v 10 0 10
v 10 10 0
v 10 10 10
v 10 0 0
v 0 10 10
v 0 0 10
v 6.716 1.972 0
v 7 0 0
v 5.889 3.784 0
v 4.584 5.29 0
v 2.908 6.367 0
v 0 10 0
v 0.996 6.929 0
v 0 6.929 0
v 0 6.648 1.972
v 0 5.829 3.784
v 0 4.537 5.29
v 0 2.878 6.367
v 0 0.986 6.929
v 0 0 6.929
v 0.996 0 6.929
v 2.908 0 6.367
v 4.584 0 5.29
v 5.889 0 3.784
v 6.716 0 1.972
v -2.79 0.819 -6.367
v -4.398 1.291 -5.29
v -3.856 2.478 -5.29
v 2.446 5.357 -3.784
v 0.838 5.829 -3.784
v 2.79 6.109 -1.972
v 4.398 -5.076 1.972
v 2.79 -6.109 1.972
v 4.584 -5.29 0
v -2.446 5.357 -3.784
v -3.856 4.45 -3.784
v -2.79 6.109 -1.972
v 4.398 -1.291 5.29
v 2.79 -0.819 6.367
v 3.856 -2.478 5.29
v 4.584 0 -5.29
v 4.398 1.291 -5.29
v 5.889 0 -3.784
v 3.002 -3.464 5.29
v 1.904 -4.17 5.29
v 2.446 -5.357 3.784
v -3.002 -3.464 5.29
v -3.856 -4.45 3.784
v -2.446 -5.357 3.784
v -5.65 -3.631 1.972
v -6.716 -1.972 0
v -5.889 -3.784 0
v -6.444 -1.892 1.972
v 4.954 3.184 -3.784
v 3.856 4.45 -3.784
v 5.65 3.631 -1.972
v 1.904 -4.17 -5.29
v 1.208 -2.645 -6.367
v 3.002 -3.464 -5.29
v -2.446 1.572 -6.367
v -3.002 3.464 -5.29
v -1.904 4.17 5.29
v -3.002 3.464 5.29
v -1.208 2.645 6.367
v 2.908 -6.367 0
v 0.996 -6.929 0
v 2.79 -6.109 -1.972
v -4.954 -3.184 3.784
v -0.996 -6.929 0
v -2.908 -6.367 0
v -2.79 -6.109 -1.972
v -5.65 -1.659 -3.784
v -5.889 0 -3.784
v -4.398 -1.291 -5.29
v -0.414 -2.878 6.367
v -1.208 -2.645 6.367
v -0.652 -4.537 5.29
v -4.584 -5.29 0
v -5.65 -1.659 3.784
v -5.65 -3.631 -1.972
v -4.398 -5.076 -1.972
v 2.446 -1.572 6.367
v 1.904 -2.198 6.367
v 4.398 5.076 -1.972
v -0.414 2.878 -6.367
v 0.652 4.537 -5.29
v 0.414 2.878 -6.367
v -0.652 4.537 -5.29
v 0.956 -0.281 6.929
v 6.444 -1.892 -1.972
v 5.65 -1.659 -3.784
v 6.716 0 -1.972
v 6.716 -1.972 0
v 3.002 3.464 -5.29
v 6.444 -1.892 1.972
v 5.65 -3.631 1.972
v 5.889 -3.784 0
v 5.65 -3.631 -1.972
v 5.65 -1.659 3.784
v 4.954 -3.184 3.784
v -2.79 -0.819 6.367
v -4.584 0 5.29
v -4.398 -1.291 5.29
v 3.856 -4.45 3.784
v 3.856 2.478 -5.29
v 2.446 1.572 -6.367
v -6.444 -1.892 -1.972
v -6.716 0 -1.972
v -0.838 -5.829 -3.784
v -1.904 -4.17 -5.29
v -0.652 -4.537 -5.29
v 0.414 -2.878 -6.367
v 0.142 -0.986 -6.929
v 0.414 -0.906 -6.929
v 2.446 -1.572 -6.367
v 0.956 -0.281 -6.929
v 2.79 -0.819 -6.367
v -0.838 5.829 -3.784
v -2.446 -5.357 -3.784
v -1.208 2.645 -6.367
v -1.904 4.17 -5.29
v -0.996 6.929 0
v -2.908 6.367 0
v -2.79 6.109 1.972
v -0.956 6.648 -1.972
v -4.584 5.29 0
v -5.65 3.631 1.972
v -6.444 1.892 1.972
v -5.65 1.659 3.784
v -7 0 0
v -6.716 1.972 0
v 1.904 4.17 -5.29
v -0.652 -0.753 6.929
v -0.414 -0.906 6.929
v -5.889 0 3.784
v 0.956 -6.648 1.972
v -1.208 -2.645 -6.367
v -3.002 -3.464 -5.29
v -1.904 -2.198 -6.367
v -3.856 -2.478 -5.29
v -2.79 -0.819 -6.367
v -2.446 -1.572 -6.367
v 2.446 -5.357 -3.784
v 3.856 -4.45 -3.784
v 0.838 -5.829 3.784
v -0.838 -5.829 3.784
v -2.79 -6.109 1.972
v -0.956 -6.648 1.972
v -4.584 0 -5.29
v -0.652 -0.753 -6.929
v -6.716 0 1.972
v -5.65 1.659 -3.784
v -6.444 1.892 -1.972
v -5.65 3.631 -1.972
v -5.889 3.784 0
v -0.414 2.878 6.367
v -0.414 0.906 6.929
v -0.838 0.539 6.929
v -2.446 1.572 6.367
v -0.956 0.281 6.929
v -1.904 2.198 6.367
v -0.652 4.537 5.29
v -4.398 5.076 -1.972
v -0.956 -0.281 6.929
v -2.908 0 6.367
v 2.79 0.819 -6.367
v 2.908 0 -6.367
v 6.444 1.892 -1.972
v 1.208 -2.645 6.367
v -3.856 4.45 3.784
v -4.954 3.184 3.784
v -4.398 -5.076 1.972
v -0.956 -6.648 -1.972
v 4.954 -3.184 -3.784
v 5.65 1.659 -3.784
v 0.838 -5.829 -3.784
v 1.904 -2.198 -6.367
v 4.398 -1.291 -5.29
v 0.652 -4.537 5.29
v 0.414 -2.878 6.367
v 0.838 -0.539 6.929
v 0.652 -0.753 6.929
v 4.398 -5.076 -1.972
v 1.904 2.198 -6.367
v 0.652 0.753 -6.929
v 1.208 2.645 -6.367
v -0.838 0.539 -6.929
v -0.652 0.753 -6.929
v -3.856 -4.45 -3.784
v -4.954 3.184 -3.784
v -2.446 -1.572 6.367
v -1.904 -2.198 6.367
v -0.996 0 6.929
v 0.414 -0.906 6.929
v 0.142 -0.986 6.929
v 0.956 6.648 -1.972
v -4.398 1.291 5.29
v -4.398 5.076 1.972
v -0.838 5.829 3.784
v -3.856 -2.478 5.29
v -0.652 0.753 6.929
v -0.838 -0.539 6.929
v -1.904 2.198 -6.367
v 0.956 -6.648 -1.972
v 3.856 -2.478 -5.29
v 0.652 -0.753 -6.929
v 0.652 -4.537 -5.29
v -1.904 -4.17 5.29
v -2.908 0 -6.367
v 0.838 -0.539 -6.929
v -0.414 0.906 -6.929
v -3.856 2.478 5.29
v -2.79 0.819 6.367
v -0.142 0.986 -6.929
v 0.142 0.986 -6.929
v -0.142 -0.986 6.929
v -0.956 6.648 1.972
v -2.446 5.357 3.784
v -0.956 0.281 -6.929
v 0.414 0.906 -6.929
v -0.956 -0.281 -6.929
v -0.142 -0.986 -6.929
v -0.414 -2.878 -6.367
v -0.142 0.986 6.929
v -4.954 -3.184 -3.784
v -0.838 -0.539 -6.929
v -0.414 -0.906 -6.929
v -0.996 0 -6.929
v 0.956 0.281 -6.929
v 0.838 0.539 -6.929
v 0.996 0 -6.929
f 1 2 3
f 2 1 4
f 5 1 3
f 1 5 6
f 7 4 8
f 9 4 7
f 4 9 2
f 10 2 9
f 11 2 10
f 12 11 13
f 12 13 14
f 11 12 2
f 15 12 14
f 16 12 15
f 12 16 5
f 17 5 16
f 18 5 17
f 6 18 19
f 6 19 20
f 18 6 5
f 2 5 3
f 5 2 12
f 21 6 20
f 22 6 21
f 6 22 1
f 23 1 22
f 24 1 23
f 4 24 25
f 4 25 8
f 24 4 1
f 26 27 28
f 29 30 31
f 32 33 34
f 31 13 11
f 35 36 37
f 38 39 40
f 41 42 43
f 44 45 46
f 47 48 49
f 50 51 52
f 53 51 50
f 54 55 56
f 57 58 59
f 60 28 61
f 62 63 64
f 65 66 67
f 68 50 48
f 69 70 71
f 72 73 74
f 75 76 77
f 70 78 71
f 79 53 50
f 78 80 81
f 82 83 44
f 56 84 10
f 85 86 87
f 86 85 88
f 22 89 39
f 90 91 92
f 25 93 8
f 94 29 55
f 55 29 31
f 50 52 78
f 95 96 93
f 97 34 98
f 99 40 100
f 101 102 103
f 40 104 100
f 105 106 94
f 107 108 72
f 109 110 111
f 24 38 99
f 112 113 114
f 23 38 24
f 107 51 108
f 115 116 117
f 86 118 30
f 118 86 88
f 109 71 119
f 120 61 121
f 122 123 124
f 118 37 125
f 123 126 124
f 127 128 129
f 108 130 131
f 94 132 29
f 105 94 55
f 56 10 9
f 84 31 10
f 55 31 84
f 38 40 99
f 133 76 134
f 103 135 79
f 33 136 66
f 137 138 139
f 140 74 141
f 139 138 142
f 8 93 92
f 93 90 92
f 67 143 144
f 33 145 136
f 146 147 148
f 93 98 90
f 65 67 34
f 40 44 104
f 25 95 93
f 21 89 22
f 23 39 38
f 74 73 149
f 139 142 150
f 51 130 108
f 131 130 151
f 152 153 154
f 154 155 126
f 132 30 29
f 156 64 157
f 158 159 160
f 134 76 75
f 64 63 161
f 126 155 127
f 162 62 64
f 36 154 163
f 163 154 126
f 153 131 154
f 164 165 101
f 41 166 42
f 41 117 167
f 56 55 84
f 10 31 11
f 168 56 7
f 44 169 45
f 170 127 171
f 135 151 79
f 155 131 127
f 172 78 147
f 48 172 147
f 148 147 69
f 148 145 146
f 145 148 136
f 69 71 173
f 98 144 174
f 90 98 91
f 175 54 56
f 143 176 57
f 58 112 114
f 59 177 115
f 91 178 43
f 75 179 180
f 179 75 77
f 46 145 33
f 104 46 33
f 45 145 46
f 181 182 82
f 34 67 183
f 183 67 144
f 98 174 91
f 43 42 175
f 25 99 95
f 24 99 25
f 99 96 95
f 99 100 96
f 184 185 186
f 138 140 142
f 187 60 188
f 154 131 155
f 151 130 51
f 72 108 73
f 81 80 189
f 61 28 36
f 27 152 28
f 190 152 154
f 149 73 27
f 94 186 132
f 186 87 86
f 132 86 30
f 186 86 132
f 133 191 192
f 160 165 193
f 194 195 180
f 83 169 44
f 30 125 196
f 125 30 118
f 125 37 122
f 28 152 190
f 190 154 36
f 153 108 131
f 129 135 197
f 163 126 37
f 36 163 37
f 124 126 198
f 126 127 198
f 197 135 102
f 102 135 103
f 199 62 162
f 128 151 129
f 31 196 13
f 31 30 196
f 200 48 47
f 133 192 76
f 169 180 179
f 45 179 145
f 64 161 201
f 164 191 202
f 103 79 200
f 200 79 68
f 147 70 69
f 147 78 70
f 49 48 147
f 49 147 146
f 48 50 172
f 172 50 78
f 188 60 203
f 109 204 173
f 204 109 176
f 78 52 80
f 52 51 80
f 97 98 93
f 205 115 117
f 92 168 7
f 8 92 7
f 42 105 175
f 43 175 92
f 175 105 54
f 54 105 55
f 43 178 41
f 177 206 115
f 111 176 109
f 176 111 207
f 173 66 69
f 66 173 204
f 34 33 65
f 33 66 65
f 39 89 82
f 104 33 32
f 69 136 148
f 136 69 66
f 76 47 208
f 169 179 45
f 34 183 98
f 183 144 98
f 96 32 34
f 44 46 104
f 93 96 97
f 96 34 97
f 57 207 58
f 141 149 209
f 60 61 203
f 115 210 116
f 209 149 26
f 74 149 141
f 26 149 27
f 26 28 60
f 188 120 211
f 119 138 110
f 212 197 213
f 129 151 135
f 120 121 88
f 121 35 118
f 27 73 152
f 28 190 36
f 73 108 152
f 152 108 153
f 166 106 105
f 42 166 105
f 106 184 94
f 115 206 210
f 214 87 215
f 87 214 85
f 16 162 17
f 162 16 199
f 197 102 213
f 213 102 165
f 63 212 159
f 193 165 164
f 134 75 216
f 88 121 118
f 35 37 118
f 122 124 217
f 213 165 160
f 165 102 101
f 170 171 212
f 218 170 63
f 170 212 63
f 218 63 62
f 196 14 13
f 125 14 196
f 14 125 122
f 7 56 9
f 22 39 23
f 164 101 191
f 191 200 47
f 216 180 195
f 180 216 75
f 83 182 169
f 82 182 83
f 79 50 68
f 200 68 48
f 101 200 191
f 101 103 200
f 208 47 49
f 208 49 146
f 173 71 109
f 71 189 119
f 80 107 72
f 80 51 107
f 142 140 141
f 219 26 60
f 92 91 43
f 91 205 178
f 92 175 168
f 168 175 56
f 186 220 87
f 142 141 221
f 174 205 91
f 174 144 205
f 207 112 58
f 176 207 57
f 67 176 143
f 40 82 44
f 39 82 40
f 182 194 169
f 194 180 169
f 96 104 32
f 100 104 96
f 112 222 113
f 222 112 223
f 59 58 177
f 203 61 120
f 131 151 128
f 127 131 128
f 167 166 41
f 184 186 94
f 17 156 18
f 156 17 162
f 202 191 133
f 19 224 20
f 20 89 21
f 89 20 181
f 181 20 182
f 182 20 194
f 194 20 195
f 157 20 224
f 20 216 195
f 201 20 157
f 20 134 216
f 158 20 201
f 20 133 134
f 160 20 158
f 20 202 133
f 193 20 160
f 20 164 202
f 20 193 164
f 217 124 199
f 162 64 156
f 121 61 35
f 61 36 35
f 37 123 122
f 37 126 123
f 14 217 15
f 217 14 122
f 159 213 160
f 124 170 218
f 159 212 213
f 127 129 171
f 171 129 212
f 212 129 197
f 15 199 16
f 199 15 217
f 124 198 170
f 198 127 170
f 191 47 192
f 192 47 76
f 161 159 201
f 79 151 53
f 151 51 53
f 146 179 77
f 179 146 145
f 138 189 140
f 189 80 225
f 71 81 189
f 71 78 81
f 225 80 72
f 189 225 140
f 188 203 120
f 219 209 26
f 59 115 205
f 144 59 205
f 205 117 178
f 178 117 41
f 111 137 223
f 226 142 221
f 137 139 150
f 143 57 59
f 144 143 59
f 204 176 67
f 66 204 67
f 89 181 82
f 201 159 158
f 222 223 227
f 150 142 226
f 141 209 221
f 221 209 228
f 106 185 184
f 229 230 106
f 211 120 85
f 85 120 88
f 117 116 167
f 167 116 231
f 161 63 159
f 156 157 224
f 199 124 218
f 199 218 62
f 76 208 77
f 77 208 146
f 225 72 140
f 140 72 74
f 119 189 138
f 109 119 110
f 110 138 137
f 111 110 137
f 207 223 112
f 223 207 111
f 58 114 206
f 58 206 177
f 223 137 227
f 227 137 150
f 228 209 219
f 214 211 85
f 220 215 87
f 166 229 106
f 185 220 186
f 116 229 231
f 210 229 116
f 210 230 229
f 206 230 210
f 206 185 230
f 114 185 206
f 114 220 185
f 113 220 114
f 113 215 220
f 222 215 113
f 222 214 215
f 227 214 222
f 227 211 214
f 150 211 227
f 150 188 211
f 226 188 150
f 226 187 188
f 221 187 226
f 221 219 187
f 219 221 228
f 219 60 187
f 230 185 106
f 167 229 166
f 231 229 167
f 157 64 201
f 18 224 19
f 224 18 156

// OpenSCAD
// model20: function definition with arithmetic expressions
function double(x) = x * 2;
function add(a, b) = a + b;

cube(double(5));
sphere(add(3, 4));
